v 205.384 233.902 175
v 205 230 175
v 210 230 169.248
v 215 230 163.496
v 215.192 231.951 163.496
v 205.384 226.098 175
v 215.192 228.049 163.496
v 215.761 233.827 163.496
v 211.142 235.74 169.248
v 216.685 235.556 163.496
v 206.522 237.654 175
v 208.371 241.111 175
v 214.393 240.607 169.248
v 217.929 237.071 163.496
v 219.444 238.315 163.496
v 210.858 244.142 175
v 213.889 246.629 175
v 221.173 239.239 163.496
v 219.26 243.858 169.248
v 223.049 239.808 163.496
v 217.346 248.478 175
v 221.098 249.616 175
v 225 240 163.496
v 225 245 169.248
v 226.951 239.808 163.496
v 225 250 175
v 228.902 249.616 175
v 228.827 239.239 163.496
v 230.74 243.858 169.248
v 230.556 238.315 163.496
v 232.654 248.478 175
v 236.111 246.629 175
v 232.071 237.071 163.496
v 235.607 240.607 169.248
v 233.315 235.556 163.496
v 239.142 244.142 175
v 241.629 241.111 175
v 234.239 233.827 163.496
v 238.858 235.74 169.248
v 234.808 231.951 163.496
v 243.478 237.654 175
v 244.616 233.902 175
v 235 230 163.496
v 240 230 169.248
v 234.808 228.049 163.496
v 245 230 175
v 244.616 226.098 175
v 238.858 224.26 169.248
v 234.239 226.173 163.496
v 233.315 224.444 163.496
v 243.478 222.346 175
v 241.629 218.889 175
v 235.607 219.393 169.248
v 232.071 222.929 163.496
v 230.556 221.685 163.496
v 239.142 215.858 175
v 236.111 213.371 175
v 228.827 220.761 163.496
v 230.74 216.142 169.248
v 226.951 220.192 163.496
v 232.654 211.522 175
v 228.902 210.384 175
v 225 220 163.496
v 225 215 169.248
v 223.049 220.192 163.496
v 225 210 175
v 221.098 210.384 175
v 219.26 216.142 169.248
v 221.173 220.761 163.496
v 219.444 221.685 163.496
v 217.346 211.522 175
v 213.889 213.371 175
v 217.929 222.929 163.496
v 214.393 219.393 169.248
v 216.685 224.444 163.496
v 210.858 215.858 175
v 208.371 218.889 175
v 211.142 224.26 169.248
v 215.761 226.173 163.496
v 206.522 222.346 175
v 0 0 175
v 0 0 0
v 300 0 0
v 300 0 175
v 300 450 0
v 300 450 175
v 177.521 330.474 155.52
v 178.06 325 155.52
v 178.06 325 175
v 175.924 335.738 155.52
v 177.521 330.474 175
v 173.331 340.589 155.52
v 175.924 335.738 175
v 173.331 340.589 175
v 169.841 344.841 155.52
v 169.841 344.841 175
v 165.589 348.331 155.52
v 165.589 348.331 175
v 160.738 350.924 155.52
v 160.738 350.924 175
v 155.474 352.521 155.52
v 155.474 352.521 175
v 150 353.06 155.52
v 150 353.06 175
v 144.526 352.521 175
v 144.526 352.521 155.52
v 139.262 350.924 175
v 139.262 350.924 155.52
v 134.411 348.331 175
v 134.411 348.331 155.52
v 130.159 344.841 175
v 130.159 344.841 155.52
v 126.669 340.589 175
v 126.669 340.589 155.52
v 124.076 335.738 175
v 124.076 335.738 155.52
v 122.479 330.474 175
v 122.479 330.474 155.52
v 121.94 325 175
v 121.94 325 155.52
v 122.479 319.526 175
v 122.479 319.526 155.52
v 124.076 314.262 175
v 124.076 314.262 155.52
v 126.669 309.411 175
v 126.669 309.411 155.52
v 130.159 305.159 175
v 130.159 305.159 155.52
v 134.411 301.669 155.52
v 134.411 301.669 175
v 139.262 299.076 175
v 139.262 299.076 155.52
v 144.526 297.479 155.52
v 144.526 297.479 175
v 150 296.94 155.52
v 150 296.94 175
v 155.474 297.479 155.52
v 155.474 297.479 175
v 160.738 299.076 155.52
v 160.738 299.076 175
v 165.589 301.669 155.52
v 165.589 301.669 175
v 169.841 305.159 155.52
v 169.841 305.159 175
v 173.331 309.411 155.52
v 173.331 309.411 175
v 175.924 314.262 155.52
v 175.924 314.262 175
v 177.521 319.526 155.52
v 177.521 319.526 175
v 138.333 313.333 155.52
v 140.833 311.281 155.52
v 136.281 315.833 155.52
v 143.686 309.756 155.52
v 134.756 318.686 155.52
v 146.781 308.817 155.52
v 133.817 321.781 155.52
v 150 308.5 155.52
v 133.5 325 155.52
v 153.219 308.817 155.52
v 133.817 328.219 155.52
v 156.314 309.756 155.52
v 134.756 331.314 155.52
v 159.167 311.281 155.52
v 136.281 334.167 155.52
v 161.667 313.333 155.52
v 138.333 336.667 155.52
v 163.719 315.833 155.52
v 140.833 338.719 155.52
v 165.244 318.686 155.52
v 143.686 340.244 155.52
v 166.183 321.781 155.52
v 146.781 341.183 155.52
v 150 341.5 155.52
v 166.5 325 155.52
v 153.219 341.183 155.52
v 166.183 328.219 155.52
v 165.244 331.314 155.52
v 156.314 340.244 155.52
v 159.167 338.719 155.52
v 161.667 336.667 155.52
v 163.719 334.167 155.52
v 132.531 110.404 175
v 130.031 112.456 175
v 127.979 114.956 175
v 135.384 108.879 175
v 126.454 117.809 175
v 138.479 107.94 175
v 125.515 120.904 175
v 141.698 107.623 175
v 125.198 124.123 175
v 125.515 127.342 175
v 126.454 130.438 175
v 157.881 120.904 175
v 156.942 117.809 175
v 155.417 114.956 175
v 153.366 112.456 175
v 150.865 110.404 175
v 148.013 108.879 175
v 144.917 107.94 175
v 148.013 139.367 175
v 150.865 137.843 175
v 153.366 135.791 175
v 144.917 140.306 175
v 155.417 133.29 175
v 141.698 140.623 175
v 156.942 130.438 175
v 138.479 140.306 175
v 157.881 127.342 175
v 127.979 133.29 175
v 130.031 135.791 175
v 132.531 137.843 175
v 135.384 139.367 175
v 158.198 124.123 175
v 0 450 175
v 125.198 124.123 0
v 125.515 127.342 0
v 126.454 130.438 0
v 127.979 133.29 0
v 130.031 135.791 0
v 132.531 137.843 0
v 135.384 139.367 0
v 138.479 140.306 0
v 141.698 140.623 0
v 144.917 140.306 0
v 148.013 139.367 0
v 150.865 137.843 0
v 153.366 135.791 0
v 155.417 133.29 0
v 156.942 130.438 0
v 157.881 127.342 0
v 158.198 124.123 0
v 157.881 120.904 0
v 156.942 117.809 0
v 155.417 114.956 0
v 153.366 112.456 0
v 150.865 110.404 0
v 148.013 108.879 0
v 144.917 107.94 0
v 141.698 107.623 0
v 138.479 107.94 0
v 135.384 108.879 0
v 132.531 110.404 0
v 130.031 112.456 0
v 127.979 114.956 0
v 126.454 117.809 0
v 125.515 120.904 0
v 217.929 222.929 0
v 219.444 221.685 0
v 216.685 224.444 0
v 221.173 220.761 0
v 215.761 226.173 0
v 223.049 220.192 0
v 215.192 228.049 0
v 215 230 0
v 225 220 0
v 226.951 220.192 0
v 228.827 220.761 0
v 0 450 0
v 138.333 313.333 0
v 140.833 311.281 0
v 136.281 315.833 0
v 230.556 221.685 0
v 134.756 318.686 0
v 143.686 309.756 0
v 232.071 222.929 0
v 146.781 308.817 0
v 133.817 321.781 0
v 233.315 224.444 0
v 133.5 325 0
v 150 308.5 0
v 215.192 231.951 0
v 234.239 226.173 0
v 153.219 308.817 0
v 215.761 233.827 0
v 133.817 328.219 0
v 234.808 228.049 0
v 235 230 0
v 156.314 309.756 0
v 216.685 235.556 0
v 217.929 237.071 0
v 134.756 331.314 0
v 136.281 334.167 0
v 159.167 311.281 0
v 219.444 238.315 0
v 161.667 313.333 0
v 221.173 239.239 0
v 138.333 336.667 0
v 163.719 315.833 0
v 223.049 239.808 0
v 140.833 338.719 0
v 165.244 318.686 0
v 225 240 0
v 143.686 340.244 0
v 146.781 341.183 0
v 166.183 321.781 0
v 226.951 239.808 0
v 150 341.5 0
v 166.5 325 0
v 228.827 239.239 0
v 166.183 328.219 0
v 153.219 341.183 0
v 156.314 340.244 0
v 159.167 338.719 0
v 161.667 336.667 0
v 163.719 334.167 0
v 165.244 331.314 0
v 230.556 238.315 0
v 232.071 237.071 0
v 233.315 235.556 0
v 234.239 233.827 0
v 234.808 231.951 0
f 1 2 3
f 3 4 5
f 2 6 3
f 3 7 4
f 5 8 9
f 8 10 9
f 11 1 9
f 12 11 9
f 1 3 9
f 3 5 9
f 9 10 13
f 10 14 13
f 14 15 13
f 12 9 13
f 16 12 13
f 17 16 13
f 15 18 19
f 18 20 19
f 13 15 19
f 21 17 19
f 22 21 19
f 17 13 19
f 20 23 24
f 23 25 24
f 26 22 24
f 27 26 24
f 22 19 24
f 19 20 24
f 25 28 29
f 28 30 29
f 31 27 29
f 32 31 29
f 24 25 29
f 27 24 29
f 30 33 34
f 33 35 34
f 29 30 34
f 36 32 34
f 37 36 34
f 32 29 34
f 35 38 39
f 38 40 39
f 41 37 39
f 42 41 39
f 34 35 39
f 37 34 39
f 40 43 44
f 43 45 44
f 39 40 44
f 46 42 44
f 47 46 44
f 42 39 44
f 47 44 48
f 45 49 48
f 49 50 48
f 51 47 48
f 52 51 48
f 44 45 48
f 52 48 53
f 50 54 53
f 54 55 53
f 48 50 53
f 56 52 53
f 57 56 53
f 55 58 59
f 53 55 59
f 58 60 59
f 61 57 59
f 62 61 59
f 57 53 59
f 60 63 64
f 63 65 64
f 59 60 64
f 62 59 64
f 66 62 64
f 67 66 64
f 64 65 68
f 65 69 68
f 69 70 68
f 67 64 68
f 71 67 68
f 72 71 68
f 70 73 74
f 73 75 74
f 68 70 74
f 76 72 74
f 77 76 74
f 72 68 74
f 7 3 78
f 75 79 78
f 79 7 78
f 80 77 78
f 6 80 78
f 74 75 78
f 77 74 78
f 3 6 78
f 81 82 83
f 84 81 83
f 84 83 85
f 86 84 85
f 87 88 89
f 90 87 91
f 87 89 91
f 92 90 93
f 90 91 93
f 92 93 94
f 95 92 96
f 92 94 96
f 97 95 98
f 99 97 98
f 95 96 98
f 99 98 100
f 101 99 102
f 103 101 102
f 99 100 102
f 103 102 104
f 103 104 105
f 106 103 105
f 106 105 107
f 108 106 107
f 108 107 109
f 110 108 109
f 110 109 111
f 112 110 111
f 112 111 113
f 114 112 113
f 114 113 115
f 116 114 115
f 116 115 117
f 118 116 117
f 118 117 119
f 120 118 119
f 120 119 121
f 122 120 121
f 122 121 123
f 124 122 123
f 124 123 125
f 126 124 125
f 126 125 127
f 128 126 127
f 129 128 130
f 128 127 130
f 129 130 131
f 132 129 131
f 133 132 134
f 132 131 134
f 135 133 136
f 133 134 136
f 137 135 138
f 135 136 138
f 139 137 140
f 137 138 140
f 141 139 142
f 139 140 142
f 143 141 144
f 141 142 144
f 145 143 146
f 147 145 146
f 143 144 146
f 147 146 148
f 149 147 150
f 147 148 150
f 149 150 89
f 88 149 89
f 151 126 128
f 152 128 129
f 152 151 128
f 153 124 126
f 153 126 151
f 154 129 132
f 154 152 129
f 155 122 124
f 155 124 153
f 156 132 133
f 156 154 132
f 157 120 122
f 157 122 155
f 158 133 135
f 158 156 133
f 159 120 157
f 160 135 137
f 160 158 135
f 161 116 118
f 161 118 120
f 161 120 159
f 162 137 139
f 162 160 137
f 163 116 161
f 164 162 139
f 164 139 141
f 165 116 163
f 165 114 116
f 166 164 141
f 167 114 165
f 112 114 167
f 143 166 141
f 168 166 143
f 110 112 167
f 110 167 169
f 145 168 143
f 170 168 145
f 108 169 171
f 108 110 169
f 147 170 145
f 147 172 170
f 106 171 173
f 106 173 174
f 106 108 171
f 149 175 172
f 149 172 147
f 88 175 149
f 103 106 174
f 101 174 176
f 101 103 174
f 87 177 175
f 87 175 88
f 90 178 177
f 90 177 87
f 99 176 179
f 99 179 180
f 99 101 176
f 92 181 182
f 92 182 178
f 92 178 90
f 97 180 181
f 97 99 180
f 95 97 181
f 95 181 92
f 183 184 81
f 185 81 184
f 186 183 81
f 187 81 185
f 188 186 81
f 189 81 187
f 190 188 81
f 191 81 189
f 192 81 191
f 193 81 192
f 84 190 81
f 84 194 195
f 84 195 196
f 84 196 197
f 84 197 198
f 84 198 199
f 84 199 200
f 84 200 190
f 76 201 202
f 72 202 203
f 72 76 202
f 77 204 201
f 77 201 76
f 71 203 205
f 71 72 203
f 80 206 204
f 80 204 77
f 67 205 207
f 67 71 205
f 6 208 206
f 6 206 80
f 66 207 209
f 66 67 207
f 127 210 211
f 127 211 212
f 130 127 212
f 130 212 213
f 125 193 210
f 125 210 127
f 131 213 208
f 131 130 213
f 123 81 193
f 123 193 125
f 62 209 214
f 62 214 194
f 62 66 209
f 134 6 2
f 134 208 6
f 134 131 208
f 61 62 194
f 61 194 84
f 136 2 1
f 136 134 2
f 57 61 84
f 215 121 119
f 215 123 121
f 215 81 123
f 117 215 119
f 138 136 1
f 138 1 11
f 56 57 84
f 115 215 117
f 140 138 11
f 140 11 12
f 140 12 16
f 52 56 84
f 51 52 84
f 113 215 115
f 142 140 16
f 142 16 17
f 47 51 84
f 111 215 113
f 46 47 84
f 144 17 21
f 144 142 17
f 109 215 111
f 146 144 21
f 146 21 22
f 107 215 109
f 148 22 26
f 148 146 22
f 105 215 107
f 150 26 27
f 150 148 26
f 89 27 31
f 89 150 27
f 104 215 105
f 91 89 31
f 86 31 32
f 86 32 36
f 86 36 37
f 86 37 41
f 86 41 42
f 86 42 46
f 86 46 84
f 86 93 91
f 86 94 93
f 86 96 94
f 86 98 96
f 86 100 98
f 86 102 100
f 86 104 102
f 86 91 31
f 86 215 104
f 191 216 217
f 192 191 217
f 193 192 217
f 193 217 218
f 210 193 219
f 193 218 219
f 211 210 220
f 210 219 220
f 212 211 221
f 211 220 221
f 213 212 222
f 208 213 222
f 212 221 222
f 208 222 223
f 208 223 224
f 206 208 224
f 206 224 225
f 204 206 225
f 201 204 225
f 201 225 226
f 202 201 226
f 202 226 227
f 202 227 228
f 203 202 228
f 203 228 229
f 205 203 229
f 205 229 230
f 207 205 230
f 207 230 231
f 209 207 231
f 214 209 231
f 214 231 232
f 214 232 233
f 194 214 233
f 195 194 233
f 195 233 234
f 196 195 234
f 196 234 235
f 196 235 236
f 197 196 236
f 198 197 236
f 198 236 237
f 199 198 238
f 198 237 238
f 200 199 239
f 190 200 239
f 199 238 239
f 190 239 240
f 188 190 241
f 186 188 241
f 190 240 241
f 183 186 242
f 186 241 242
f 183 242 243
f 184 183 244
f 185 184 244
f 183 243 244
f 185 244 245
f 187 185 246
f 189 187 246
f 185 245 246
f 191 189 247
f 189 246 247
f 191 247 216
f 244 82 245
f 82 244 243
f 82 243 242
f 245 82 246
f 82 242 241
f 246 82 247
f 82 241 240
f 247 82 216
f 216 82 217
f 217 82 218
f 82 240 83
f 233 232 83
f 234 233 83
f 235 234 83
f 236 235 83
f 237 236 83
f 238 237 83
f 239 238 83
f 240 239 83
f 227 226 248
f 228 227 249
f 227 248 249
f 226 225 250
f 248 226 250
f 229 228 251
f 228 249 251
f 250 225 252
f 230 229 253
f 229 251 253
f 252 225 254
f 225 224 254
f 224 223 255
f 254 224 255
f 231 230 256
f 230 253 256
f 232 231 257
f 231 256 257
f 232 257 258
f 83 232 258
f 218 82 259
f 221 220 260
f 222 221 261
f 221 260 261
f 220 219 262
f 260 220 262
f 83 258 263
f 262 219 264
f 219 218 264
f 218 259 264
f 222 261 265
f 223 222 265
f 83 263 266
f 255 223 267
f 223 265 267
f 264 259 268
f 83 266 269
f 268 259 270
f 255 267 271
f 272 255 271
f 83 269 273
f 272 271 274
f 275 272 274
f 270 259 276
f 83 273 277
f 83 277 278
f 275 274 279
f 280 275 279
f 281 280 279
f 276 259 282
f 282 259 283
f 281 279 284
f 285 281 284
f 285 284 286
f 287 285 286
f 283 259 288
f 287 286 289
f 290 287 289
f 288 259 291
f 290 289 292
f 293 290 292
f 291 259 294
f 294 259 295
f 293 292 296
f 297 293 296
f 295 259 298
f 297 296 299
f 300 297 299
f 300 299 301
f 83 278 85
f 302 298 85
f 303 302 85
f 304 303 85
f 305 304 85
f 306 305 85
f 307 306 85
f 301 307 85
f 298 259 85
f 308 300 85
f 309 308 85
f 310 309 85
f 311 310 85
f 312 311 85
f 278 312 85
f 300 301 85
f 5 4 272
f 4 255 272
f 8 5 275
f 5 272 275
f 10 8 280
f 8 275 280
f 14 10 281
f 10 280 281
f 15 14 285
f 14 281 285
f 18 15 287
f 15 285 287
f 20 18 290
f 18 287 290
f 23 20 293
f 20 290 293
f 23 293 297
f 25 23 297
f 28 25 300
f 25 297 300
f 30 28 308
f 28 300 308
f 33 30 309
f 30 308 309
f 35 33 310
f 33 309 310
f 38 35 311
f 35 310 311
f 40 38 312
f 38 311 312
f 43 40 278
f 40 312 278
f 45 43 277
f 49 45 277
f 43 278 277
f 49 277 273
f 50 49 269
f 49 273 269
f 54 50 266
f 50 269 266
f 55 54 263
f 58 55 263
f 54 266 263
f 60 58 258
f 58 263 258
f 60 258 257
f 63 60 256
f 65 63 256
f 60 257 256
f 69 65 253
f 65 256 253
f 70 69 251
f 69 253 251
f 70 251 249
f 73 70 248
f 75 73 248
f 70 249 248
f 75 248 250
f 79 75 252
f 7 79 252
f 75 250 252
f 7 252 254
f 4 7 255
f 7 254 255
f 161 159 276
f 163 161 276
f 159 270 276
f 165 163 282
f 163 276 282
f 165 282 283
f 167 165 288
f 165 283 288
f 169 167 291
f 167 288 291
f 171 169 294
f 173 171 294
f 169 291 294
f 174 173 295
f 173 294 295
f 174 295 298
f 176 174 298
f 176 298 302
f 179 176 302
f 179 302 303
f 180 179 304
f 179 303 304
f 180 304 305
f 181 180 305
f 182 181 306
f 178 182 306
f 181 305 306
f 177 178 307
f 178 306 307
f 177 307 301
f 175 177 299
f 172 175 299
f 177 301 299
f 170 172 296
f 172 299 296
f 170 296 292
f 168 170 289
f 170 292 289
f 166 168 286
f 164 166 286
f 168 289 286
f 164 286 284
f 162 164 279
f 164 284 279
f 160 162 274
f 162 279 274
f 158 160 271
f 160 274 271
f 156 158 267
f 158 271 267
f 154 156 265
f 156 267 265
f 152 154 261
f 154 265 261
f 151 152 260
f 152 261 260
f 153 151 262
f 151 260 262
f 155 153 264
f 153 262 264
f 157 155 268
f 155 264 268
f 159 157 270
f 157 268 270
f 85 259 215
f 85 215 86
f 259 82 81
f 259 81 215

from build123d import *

# Parameters (mm, degrees)
SKETCH1_W                                     = 300
SKETCH1_H                                     = 450
BOSS_EXTRUDE1_DEPTH                           = 175
CBORE_FOR_M30_HEX_HEAD_CAP_SCREW1_D           = 33
CBORE_FOR_M30_HEX_HEAD_CAP_SCREW1_CBORE_D     = 56.12
CBORE_FOR_M30_HEX_HEAD_CAP_SCREW1_CBORE_DEPTH = 19.48
M36X3_0_TAPPED_HOLE1_D                        = 33
HOLE1_D                                       = 20
HOLE1_CSINK_D                                 = 40
HOLE1_CSINK_ANGLE                             = 82


with BuildPart() as part:
    # Sketch1 → Boss-Extrude1 (new body)
    with BuildSketch(Plane.XY):
        with Locations((150, 225)):
            Rectangle(SKETCH1_W, SKETCH1_H)
    extrude(amount=BOSS_EXTRUDE1_DEPTH)

    # CBORE for M30 Hex Head Cap Screw1 (through all)
    with Locations(Plane.XY.offset(175)):
        with Locations((150, 325)):
            CounterBoreHole(CBORE_FOR_M30_HEX_HEAD_CAP_SCREW1_D / 2, CBORE_FOR_M30_HEX_HEAD_CAP_SCREW1_CBORE_D / 2, CBORE_FOR_M30_HEX_HEAD_CAP_SCREW1_CBORE_DEPTH)

    # M36x3.0 Tapped Hole1 (through all)
    with Locations(Plane.XY.offset(175)):
        with Locations((141.698240344, 124.123333408)):
            Hole(M36X3_0_TAPPED_HOLE1_D / 2)

    # Hole1 (through all)
    with Locations(Plane.XY.offset(175)):
        with Locations((225, 230)):
            CounterSinkHole(HOLE1_D / 2, HOLE1_CSINK_D / 2, counter_sink_angle=HOLE1_CSINK_ANGLE)


solid = part.part
